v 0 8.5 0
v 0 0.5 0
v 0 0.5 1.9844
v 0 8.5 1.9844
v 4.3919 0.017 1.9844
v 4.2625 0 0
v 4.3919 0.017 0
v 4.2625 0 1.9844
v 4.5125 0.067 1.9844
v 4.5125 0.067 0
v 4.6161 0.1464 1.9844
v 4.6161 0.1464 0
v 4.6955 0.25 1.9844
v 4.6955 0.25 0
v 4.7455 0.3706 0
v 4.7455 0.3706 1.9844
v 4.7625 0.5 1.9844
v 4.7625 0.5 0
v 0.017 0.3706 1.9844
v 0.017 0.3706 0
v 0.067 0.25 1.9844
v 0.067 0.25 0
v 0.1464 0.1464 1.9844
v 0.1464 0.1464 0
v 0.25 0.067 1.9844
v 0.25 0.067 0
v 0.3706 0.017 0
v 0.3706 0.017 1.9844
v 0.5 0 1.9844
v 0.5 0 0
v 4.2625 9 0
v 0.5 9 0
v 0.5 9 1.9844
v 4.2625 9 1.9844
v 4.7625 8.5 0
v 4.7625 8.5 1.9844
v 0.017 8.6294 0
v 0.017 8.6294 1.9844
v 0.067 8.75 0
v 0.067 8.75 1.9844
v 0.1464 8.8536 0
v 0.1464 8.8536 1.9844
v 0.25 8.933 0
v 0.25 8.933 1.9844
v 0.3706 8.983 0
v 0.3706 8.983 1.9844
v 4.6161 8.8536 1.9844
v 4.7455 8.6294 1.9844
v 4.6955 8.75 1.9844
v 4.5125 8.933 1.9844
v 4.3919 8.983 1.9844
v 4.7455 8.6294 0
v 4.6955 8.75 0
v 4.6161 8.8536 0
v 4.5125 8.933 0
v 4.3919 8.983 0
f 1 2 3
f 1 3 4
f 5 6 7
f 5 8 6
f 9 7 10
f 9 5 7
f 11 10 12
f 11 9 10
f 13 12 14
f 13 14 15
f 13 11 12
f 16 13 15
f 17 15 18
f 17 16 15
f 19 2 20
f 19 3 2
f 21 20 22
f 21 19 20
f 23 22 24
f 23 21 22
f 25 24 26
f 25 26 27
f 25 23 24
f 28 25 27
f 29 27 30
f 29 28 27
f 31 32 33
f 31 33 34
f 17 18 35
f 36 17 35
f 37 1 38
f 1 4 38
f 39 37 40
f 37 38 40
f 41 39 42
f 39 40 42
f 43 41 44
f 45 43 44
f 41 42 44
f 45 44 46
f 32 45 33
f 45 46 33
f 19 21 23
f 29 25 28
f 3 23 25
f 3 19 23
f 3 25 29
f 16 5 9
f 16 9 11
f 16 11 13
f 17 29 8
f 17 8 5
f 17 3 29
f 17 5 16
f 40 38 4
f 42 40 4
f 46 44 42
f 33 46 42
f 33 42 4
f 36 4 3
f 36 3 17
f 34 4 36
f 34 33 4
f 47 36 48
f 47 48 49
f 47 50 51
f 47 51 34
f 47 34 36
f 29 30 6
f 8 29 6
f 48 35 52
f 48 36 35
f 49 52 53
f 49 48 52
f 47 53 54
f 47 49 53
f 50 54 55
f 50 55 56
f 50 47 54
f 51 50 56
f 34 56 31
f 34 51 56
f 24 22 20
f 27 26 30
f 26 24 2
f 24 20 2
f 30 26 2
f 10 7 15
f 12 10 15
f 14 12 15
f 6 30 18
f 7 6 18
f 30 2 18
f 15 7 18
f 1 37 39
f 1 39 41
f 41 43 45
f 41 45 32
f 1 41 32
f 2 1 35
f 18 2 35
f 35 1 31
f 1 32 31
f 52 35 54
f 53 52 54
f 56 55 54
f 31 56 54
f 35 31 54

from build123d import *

# Parameters (mm, degrees)
SKETCH1_W           = 4.7625
SKETCH1_H           = 9
BOSS_EXTRUDE1_DEPTH = 1.984375
FILLET1_R           = 0.5
FILLET2_R           = 0.5


with BuildPart() as part:
    # Sketch1 → Boss-Extrude1 (new body)
    with BuildSketch(Plane.XY):
        with Locations((2.38125, 4.5)):
            Rectangle(SKETCH1_W, SKETCH1_H)
    extrude(amount=BOSS_EXTRUDE1_DEPTH)

    # Fillet1
    fillet1_edges = [part.edges().sort_by_distance(p)[0] for p in [
        (0, 9, 0.9921875),
        (4.7625, 9, 0.9921875),
    ]]
    fillet(fillet1_edges, radius=FILLET1_R)

    # Fillet2
    fillet2_edges = [part.edges().sort_by_distance(p)[0] for p in [
        (4.7625, 0, 0.9921875),
        (0, 0, 0.9921875),
    ]]
    fillet(fillet2_edges, radius=FILLET2_R)


solid = part.part
